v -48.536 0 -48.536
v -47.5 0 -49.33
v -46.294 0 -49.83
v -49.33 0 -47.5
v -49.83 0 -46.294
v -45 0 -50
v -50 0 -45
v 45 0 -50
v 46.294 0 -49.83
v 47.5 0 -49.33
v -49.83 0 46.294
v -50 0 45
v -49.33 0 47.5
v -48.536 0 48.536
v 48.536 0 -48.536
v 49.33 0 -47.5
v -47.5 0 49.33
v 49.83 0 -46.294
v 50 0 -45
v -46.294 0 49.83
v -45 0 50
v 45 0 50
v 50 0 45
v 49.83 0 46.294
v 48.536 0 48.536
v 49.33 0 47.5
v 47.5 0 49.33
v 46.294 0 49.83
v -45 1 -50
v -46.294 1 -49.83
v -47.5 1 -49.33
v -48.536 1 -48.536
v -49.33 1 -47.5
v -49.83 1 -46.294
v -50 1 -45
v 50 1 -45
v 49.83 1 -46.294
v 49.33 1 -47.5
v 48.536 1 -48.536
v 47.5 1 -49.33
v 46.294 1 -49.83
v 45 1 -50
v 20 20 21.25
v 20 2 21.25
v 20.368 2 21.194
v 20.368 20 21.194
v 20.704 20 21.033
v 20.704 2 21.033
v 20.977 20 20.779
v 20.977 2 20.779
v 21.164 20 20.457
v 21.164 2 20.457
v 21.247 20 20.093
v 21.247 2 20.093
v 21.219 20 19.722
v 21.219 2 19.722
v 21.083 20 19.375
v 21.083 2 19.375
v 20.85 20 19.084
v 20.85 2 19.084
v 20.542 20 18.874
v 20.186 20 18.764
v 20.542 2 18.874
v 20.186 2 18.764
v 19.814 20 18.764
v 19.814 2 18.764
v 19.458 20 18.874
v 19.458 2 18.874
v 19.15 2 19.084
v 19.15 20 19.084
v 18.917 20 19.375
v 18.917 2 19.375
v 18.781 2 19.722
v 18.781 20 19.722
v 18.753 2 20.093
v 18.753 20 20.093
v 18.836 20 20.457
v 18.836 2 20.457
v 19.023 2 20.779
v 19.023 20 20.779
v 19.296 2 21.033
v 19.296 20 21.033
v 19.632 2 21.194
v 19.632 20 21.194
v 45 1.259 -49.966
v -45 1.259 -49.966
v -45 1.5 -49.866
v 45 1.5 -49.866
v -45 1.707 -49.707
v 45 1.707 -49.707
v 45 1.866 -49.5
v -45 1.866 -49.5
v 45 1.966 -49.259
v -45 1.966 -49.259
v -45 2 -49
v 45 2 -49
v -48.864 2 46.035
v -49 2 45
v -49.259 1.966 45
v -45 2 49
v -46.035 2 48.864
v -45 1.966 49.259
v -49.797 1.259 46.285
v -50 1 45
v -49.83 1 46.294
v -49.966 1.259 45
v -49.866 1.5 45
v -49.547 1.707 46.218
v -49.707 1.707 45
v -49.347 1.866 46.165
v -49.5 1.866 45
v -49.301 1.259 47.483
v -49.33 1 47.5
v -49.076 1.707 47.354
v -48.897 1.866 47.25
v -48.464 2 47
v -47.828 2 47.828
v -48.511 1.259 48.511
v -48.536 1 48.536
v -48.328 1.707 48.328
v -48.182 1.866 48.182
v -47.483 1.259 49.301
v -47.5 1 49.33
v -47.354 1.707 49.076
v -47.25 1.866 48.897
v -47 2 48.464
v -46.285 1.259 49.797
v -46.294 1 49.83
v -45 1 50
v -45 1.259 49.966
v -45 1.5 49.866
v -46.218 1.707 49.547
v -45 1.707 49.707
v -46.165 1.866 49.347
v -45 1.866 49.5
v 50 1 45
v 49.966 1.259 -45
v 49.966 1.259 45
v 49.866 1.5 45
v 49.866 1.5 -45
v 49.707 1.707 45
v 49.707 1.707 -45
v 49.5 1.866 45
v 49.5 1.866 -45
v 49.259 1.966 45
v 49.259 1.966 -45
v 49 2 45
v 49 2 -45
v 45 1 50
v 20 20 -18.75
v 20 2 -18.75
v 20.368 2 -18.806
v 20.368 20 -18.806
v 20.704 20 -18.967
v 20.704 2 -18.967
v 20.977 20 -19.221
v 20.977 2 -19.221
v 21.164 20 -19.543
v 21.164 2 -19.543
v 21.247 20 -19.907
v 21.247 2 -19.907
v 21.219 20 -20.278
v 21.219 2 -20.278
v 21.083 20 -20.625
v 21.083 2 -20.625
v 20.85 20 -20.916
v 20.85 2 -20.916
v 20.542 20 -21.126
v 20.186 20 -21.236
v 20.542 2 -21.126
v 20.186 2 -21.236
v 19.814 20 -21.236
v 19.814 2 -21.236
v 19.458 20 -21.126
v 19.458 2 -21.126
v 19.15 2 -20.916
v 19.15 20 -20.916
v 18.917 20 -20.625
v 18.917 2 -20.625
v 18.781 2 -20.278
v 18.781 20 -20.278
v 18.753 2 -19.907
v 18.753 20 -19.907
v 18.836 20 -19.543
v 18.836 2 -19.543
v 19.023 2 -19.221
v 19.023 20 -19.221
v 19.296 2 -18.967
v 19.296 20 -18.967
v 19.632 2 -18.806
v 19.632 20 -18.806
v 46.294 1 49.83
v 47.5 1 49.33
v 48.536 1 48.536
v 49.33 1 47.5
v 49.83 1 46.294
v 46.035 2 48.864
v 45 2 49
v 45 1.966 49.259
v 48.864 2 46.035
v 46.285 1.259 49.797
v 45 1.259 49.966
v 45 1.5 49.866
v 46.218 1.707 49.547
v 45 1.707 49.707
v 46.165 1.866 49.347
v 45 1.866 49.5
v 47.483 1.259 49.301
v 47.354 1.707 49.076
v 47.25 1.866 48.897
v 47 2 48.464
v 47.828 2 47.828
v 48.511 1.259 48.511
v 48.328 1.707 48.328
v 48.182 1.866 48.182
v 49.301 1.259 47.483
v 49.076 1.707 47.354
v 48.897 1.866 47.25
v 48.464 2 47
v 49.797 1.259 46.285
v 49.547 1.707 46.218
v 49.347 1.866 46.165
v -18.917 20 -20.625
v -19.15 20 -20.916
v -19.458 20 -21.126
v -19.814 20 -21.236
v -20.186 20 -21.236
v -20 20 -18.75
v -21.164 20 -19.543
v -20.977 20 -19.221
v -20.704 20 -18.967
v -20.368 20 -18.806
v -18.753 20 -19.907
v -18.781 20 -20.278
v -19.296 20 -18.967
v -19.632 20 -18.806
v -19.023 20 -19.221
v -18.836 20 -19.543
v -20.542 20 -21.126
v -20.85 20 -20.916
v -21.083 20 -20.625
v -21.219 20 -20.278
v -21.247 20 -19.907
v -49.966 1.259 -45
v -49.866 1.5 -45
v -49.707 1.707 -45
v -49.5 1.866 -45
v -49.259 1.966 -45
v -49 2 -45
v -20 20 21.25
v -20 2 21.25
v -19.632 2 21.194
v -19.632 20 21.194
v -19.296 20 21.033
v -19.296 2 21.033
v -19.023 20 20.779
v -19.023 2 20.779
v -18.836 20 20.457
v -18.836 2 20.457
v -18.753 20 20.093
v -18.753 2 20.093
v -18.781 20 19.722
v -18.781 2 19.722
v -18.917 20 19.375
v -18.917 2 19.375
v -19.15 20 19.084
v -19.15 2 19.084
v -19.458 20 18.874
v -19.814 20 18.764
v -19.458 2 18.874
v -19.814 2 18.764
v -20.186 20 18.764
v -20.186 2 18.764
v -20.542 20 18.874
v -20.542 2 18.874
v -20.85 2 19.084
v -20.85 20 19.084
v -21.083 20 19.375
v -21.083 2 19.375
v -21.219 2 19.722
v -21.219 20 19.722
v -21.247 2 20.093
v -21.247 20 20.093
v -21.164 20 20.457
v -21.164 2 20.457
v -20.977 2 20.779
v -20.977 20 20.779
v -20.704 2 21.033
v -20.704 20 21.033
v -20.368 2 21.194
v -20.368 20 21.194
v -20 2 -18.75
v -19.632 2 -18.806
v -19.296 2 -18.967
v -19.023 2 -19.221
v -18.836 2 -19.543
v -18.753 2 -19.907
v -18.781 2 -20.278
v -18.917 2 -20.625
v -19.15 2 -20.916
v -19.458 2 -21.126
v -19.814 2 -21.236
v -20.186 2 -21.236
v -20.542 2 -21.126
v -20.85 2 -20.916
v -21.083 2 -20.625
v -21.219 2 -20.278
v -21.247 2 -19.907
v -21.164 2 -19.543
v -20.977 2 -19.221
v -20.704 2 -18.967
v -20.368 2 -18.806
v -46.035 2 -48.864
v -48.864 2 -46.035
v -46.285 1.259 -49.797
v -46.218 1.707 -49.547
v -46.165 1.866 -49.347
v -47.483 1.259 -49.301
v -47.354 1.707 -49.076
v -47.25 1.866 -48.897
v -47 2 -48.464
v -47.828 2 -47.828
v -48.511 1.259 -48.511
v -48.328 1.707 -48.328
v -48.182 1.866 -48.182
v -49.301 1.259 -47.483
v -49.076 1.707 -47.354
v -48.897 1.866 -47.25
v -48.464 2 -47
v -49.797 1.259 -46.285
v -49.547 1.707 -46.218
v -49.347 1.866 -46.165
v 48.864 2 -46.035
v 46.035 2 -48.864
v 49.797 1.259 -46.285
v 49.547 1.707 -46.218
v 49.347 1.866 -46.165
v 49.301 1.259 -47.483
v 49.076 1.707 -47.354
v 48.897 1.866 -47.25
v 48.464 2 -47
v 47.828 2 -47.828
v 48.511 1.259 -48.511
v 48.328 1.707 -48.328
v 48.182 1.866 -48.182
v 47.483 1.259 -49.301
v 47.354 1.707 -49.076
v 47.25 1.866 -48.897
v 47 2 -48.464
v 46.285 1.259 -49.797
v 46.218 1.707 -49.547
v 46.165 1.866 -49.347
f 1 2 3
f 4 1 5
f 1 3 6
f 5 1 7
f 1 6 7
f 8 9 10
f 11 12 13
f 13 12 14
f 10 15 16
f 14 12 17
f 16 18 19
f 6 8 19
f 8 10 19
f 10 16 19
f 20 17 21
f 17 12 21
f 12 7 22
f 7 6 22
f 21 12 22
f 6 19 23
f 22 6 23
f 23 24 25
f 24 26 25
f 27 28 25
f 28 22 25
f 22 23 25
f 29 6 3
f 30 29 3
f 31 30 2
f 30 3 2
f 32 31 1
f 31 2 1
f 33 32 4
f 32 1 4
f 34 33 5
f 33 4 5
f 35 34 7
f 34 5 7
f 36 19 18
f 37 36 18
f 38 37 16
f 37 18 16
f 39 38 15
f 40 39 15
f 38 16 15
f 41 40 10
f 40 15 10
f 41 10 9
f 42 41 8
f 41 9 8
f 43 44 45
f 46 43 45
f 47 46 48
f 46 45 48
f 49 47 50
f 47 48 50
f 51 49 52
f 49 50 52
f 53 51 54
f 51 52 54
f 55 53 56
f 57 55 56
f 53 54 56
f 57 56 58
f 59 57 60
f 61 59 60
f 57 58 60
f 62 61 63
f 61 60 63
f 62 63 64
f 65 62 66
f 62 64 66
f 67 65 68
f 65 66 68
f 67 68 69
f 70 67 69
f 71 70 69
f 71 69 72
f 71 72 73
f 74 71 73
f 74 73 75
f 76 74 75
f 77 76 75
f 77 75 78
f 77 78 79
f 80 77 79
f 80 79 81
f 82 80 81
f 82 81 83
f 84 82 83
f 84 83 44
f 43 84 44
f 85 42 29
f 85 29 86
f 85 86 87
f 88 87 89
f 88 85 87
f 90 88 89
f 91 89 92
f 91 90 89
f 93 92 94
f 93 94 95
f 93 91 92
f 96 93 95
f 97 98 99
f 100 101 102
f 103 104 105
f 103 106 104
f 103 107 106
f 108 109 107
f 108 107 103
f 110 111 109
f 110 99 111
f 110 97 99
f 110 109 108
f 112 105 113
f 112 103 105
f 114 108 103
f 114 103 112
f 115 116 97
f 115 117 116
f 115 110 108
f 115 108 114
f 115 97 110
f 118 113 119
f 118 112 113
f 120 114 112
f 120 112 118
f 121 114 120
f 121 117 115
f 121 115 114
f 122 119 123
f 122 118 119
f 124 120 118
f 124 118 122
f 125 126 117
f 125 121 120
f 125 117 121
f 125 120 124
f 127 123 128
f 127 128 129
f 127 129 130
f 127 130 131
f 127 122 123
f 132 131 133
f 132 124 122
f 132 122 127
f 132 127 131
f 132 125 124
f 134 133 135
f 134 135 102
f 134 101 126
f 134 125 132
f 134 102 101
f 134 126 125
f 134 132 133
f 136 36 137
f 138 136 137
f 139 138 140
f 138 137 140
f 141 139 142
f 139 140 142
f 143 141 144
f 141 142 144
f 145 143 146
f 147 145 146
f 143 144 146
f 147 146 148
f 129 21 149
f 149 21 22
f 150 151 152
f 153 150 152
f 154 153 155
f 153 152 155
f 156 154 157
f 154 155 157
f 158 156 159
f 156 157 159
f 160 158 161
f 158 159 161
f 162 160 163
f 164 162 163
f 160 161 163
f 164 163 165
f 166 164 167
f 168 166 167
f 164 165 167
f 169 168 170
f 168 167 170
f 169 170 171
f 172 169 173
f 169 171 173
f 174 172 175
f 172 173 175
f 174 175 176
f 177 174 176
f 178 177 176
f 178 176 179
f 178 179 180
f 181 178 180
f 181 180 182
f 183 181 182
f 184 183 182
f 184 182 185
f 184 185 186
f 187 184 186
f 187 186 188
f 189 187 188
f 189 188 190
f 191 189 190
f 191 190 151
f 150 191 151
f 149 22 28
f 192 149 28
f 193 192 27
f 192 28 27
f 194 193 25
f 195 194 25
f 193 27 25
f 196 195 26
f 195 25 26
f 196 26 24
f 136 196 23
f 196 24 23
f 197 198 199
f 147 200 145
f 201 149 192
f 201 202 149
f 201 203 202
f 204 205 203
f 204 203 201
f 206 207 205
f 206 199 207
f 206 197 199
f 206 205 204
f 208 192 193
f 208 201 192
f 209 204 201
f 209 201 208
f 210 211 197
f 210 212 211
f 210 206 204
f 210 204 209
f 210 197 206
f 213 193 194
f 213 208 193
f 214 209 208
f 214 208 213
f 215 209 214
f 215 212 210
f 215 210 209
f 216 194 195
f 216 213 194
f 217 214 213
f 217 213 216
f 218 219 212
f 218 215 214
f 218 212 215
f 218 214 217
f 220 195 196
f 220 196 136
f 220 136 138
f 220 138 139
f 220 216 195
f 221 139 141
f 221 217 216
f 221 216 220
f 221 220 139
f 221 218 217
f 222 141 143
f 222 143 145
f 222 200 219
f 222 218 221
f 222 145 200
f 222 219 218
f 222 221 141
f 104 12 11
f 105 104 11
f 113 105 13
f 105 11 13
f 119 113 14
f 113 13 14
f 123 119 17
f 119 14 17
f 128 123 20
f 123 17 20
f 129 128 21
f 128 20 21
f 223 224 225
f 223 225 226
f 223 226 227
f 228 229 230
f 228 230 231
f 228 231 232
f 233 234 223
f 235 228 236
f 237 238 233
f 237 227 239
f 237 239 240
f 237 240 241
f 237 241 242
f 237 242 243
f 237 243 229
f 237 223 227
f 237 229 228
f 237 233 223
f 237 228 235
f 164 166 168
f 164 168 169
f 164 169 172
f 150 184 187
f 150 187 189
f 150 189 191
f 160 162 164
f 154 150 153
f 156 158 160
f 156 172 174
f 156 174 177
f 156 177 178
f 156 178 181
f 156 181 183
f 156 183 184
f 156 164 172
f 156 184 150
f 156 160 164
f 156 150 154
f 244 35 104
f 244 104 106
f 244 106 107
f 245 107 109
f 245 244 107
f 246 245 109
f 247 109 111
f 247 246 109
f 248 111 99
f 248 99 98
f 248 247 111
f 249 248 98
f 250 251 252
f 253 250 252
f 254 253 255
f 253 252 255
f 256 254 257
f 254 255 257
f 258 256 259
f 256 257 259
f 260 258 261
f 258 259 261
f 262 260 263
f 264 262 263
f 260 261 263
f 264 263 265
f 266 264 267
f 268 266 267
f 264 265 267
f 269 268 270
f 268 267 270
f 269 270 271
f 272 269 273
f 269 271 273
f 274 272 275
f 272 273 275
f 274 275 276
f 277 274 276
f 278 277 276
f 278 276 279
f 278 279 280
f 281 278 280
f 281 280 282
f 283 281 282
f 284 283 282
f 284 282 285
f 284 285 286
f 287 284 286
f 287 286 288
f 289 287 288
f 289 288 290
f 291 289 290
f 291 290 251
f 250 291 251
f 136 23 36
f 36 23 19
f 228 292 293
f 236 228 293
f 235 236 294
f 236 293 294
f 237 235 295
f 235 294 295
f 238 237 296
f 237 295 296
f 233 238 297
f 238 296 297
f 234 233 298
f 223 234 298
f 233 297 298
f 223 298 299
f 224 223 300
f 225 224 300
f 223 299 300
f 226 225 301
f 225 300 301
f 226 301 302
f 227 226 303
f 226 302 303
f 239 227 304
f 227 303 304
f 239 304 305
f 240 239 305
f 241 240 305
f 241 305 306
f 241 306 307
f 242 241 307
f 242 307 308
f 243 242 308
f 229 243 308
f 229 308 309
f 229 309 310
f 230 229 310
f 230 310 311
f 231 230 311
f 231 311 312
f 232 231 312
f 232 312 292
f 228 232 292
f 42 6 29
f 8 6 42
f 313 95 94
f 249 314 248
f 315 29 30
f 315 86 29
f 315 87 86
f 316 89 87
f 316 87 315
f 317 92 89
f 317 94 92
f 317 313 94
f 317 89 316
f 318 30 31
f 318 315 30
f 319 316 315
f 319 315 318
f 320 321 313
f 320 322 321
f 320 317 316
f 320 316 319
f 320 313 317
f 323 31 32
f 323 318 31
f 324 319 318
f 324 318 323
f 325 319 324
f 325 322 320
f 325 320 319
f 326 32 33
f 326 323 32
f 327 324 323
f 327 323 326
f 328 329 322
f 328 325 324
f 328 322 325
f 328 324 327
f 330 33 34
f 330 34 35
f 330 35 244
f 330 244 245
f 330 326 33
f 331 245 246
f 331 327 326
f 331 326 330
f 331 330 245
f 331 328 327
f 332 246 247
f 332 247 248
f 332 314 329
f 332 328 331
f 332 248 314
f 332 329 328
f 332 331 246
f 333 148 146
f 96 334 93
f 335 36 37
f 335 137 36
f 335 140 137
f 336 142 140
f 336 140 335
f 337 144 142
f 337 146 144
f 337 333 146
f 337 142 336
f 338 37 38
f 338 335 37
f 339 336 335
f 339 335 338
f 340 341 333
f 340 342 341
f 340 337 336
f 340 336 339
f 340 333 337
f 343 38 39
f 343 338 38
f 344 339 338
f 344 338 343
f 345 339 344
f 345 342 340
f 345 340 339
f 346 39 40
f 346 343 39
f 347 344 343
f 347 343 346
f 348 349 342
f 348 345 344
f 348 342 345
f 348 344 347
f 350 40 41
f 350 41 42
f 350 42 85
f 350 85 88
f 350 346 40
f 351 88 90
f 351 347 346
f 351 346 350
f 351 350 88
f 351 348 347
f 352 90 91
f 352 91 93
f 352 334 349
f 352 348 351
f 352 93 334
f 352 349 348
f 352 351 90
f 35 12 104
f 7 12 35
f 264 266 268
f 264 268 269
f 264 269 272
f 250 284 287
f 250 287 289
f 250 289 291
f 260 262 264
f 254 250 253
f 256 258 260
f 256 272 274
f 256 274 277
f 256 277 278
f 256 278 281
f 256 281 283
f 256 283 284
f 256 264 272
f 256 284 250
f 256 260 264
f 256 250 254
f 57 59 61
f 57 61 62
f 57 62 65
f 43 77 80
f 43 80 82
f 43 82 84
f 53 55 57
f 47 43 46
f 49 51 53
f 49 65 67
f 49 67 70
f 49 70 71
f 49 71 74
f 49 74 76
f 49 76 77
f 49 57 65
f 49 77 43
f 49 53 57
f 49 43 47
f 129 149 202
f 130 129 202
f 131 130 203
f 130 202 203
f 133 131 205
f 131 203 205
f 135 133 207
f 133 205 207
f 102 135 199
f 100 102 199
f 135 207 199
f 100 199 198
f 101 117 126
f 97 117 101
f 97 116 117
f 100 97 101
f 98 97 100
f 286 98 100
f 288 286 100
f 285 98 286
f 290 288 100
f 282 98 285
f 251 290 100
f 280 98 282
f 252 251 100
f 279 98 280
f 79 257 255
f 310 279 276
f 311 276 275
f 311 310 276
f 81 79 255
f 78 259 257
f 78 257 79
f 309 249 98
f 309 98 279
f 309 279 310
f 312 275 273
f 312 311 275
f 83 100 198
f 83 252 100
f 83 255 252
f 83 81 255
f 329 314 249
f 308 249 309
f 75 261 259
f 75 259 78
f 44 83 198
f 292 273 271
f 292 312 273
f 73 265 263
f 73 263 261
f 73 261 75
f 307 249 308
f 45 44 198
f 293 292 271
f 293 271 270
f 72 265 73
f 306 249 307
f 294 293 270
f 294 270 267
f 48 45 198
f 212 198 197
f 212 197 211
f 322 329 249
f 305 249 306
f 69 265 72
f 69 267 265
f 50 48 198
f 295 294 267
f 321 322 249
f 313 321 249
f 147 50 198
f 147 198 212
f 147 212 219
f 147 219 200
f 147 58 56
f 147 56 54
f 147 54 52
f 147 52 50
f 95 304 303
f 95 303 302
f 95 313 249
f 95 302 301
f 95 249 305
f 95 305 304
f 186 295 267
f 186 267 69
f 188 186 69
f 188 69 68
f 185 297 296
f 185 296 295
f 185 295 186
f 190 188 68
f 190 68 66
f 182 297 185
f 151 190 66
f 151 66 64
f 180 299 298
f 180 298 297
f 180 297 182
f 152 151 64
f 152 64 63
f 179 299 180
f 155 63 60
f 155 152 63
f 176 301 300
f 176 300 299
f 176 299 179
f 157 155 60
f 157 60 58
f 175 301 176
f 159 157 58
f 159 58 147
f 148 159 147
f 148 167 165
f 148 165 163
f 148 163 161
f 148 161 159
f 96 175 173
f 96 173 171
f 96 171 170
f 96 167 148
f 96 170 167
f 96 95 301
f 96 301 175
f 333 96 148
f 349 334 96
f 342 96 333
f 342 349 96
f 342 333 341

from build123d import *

# Parameters (mm, degrees)
SKETCH1_W           = 100
SKETCH1_H           = 100
BOSS_EXTRUDE1_DEPTH = 2
SKETCH2_R           = 1.25
BOSS_EXTRUDE2_DEPTH = 20
FILLET1_R           = 1
FILLET2_R           = 5


with BuildPart() as part:
    # Sketch1 → Boss-Extrude1 (new body)
    with BuildSketch(Plane(origin=(0, 0, 0), x_dir=(1, 0, 0), z_dir=(0, 1, 0))):
        Rectangle(SKETCH1_W, SKETCH1_H)
    extrude(amount=BOSS_EXTRUDE1_DEPTH)

    # Sketch2 → Boss-Extrude2 (add)
    with BuildSketch(Plane(origin=(0, 0, 0), x_dir=(1, 0, 0), z_dir=(0, 1, 0))):
        with Locations(Location((-20, -20, 0), (0, 0, 270))):
            Circle(SKETCH2_R)
        with Locations(Location((-20, 20, 0), (0, 0, 270))):
            Circle(SKETCH2_R)
        with Locations(Location((20, 20, 0), (0, 0, 270))):
            Circle(SKETCH2_R)
        with Locations(Location((20, -20, 0), (0, 0, 270))):
            Circle(SKETCH2_R)
    extrude(amount=BOSS_EXTRUDE2_DEPTH)

    # Fillet1
    fillet1_edges = [part.edges().sort_by_distance(p)[0] for p in [
        (-50, 2, 0),
        (0, 2, 50),
        (50, 2, 0),
        (0, 2, -50),
    ]]
    fillet(fillet1_edges, radius=FILLET1_R)

    # Fillet2
    # the kernel refuses this fillet: 5 mm, written as the material it takes off along each edge
    with BuildSketch(Plane(origin=(-45, 2, 45), x_dir=(-1, 0, 0), z_dir=(0, 0, -1))) as fillet2_piece_1:
        with BuildLine():
            CenterArc((4, -1), 1, 0, 90)
            Line((5, -1), (5, 0))
            Line((5, 0), (4, 0))
        make_face()
    revolve(axis=Axis((-45, 2, 45), (0, 1, 0)), revolution_arc=90, mode=Mode.SUBTRACT)
    with BuildSketch(Plane(origin=(-45, 2, -45), x_dir=(0, 0, -1), z_dir=(1, 0, 0))) as fillet2_piece_2:
        with BuildLine():
            CenterArc((4, -1), 1, 0, 90)
            Line((5, -1), (5, 0))
            Line((5, 0), (4, 0))
        make_face()
    revolve(axis=Axis((-45, 2, -45), (0, 1, 0)), revolution_arc=90, mode=Mode.SUBTRACT)
    with BuildSketch(Plane(origin=(45, 2, 45), x_dir=(0, 0, 1), z_dir=(-1, 0, 0))) as fillet2_piece_3:
        with BuildLine():
            CenterArc((4, -1), 1, 0, 90)
            Line((5, -1), (5, 0))
            Line((5, 0), (4, 0))
        make_face()
    revolve(axis=Axis((45, 2, 45), (0, 1, 0)), revolution_arc=90, mode=Mode.SUBTRACT)
    with BuildSketch(Plane(origin=(45, 2, -45), x_dir=(1, 0, 0), z_dir=(0, 0, 1))) as fillet2_piece_4:
        with BuildLine():
            CenterArc((4, -1), 1, 0, 90)
            Line((5, -1), (5, 0))
            Line((5, 0), (4, 0))
        make_face()
    revolve(axis=Axis((45, 2, -45), (0, 1, 0)), revolution_arc=90, mode=Mode.SUBTRACT)
    with BuildSketch(Plane(origin=(50, -12.5, -50), x_dir=(-1, 0, 0), z_dir=(0, 1, 0)), Plane(origin=(50, -12.5, 50), x_dir=(0, 0, -1), z_dir=(0, 1, 0))) as fillet2_piece_5:
        with BuildLine():
            CenterArc((FILLET2_R, FILLET2_R), FILLET2_R, 180, 90)
            Line((0, FILLET2_R), (0, 0))
            Line((0, 0), (FILLET2_R, 0))
        make_face()
    extrude(amount=14.5, mode=Mode.SUBTRACT)
    with BuildSketch(Plane(origin=(-50, -12.5, -50), x_dir=(1, 0, 0), z_dir=(0, 1, 0)), Plane(origin=(-50, -12.5, 50), x_dir=(0, 0, -1), z_dir=(0, 1, 0))) as fillet2_piece_6:
        with BuildLine():
            CenterArc((FILLET2_R, -FILLET2_R), FILLET2_R, 90, 90)
            Line((0, -FILLET2_R), (0, 0))
            Line((0, 0), (FILLET2_R, 0))
        make_face()
    extrude(amount=14.5, mode=Mode.SUBTRACT)


solid = part.part
